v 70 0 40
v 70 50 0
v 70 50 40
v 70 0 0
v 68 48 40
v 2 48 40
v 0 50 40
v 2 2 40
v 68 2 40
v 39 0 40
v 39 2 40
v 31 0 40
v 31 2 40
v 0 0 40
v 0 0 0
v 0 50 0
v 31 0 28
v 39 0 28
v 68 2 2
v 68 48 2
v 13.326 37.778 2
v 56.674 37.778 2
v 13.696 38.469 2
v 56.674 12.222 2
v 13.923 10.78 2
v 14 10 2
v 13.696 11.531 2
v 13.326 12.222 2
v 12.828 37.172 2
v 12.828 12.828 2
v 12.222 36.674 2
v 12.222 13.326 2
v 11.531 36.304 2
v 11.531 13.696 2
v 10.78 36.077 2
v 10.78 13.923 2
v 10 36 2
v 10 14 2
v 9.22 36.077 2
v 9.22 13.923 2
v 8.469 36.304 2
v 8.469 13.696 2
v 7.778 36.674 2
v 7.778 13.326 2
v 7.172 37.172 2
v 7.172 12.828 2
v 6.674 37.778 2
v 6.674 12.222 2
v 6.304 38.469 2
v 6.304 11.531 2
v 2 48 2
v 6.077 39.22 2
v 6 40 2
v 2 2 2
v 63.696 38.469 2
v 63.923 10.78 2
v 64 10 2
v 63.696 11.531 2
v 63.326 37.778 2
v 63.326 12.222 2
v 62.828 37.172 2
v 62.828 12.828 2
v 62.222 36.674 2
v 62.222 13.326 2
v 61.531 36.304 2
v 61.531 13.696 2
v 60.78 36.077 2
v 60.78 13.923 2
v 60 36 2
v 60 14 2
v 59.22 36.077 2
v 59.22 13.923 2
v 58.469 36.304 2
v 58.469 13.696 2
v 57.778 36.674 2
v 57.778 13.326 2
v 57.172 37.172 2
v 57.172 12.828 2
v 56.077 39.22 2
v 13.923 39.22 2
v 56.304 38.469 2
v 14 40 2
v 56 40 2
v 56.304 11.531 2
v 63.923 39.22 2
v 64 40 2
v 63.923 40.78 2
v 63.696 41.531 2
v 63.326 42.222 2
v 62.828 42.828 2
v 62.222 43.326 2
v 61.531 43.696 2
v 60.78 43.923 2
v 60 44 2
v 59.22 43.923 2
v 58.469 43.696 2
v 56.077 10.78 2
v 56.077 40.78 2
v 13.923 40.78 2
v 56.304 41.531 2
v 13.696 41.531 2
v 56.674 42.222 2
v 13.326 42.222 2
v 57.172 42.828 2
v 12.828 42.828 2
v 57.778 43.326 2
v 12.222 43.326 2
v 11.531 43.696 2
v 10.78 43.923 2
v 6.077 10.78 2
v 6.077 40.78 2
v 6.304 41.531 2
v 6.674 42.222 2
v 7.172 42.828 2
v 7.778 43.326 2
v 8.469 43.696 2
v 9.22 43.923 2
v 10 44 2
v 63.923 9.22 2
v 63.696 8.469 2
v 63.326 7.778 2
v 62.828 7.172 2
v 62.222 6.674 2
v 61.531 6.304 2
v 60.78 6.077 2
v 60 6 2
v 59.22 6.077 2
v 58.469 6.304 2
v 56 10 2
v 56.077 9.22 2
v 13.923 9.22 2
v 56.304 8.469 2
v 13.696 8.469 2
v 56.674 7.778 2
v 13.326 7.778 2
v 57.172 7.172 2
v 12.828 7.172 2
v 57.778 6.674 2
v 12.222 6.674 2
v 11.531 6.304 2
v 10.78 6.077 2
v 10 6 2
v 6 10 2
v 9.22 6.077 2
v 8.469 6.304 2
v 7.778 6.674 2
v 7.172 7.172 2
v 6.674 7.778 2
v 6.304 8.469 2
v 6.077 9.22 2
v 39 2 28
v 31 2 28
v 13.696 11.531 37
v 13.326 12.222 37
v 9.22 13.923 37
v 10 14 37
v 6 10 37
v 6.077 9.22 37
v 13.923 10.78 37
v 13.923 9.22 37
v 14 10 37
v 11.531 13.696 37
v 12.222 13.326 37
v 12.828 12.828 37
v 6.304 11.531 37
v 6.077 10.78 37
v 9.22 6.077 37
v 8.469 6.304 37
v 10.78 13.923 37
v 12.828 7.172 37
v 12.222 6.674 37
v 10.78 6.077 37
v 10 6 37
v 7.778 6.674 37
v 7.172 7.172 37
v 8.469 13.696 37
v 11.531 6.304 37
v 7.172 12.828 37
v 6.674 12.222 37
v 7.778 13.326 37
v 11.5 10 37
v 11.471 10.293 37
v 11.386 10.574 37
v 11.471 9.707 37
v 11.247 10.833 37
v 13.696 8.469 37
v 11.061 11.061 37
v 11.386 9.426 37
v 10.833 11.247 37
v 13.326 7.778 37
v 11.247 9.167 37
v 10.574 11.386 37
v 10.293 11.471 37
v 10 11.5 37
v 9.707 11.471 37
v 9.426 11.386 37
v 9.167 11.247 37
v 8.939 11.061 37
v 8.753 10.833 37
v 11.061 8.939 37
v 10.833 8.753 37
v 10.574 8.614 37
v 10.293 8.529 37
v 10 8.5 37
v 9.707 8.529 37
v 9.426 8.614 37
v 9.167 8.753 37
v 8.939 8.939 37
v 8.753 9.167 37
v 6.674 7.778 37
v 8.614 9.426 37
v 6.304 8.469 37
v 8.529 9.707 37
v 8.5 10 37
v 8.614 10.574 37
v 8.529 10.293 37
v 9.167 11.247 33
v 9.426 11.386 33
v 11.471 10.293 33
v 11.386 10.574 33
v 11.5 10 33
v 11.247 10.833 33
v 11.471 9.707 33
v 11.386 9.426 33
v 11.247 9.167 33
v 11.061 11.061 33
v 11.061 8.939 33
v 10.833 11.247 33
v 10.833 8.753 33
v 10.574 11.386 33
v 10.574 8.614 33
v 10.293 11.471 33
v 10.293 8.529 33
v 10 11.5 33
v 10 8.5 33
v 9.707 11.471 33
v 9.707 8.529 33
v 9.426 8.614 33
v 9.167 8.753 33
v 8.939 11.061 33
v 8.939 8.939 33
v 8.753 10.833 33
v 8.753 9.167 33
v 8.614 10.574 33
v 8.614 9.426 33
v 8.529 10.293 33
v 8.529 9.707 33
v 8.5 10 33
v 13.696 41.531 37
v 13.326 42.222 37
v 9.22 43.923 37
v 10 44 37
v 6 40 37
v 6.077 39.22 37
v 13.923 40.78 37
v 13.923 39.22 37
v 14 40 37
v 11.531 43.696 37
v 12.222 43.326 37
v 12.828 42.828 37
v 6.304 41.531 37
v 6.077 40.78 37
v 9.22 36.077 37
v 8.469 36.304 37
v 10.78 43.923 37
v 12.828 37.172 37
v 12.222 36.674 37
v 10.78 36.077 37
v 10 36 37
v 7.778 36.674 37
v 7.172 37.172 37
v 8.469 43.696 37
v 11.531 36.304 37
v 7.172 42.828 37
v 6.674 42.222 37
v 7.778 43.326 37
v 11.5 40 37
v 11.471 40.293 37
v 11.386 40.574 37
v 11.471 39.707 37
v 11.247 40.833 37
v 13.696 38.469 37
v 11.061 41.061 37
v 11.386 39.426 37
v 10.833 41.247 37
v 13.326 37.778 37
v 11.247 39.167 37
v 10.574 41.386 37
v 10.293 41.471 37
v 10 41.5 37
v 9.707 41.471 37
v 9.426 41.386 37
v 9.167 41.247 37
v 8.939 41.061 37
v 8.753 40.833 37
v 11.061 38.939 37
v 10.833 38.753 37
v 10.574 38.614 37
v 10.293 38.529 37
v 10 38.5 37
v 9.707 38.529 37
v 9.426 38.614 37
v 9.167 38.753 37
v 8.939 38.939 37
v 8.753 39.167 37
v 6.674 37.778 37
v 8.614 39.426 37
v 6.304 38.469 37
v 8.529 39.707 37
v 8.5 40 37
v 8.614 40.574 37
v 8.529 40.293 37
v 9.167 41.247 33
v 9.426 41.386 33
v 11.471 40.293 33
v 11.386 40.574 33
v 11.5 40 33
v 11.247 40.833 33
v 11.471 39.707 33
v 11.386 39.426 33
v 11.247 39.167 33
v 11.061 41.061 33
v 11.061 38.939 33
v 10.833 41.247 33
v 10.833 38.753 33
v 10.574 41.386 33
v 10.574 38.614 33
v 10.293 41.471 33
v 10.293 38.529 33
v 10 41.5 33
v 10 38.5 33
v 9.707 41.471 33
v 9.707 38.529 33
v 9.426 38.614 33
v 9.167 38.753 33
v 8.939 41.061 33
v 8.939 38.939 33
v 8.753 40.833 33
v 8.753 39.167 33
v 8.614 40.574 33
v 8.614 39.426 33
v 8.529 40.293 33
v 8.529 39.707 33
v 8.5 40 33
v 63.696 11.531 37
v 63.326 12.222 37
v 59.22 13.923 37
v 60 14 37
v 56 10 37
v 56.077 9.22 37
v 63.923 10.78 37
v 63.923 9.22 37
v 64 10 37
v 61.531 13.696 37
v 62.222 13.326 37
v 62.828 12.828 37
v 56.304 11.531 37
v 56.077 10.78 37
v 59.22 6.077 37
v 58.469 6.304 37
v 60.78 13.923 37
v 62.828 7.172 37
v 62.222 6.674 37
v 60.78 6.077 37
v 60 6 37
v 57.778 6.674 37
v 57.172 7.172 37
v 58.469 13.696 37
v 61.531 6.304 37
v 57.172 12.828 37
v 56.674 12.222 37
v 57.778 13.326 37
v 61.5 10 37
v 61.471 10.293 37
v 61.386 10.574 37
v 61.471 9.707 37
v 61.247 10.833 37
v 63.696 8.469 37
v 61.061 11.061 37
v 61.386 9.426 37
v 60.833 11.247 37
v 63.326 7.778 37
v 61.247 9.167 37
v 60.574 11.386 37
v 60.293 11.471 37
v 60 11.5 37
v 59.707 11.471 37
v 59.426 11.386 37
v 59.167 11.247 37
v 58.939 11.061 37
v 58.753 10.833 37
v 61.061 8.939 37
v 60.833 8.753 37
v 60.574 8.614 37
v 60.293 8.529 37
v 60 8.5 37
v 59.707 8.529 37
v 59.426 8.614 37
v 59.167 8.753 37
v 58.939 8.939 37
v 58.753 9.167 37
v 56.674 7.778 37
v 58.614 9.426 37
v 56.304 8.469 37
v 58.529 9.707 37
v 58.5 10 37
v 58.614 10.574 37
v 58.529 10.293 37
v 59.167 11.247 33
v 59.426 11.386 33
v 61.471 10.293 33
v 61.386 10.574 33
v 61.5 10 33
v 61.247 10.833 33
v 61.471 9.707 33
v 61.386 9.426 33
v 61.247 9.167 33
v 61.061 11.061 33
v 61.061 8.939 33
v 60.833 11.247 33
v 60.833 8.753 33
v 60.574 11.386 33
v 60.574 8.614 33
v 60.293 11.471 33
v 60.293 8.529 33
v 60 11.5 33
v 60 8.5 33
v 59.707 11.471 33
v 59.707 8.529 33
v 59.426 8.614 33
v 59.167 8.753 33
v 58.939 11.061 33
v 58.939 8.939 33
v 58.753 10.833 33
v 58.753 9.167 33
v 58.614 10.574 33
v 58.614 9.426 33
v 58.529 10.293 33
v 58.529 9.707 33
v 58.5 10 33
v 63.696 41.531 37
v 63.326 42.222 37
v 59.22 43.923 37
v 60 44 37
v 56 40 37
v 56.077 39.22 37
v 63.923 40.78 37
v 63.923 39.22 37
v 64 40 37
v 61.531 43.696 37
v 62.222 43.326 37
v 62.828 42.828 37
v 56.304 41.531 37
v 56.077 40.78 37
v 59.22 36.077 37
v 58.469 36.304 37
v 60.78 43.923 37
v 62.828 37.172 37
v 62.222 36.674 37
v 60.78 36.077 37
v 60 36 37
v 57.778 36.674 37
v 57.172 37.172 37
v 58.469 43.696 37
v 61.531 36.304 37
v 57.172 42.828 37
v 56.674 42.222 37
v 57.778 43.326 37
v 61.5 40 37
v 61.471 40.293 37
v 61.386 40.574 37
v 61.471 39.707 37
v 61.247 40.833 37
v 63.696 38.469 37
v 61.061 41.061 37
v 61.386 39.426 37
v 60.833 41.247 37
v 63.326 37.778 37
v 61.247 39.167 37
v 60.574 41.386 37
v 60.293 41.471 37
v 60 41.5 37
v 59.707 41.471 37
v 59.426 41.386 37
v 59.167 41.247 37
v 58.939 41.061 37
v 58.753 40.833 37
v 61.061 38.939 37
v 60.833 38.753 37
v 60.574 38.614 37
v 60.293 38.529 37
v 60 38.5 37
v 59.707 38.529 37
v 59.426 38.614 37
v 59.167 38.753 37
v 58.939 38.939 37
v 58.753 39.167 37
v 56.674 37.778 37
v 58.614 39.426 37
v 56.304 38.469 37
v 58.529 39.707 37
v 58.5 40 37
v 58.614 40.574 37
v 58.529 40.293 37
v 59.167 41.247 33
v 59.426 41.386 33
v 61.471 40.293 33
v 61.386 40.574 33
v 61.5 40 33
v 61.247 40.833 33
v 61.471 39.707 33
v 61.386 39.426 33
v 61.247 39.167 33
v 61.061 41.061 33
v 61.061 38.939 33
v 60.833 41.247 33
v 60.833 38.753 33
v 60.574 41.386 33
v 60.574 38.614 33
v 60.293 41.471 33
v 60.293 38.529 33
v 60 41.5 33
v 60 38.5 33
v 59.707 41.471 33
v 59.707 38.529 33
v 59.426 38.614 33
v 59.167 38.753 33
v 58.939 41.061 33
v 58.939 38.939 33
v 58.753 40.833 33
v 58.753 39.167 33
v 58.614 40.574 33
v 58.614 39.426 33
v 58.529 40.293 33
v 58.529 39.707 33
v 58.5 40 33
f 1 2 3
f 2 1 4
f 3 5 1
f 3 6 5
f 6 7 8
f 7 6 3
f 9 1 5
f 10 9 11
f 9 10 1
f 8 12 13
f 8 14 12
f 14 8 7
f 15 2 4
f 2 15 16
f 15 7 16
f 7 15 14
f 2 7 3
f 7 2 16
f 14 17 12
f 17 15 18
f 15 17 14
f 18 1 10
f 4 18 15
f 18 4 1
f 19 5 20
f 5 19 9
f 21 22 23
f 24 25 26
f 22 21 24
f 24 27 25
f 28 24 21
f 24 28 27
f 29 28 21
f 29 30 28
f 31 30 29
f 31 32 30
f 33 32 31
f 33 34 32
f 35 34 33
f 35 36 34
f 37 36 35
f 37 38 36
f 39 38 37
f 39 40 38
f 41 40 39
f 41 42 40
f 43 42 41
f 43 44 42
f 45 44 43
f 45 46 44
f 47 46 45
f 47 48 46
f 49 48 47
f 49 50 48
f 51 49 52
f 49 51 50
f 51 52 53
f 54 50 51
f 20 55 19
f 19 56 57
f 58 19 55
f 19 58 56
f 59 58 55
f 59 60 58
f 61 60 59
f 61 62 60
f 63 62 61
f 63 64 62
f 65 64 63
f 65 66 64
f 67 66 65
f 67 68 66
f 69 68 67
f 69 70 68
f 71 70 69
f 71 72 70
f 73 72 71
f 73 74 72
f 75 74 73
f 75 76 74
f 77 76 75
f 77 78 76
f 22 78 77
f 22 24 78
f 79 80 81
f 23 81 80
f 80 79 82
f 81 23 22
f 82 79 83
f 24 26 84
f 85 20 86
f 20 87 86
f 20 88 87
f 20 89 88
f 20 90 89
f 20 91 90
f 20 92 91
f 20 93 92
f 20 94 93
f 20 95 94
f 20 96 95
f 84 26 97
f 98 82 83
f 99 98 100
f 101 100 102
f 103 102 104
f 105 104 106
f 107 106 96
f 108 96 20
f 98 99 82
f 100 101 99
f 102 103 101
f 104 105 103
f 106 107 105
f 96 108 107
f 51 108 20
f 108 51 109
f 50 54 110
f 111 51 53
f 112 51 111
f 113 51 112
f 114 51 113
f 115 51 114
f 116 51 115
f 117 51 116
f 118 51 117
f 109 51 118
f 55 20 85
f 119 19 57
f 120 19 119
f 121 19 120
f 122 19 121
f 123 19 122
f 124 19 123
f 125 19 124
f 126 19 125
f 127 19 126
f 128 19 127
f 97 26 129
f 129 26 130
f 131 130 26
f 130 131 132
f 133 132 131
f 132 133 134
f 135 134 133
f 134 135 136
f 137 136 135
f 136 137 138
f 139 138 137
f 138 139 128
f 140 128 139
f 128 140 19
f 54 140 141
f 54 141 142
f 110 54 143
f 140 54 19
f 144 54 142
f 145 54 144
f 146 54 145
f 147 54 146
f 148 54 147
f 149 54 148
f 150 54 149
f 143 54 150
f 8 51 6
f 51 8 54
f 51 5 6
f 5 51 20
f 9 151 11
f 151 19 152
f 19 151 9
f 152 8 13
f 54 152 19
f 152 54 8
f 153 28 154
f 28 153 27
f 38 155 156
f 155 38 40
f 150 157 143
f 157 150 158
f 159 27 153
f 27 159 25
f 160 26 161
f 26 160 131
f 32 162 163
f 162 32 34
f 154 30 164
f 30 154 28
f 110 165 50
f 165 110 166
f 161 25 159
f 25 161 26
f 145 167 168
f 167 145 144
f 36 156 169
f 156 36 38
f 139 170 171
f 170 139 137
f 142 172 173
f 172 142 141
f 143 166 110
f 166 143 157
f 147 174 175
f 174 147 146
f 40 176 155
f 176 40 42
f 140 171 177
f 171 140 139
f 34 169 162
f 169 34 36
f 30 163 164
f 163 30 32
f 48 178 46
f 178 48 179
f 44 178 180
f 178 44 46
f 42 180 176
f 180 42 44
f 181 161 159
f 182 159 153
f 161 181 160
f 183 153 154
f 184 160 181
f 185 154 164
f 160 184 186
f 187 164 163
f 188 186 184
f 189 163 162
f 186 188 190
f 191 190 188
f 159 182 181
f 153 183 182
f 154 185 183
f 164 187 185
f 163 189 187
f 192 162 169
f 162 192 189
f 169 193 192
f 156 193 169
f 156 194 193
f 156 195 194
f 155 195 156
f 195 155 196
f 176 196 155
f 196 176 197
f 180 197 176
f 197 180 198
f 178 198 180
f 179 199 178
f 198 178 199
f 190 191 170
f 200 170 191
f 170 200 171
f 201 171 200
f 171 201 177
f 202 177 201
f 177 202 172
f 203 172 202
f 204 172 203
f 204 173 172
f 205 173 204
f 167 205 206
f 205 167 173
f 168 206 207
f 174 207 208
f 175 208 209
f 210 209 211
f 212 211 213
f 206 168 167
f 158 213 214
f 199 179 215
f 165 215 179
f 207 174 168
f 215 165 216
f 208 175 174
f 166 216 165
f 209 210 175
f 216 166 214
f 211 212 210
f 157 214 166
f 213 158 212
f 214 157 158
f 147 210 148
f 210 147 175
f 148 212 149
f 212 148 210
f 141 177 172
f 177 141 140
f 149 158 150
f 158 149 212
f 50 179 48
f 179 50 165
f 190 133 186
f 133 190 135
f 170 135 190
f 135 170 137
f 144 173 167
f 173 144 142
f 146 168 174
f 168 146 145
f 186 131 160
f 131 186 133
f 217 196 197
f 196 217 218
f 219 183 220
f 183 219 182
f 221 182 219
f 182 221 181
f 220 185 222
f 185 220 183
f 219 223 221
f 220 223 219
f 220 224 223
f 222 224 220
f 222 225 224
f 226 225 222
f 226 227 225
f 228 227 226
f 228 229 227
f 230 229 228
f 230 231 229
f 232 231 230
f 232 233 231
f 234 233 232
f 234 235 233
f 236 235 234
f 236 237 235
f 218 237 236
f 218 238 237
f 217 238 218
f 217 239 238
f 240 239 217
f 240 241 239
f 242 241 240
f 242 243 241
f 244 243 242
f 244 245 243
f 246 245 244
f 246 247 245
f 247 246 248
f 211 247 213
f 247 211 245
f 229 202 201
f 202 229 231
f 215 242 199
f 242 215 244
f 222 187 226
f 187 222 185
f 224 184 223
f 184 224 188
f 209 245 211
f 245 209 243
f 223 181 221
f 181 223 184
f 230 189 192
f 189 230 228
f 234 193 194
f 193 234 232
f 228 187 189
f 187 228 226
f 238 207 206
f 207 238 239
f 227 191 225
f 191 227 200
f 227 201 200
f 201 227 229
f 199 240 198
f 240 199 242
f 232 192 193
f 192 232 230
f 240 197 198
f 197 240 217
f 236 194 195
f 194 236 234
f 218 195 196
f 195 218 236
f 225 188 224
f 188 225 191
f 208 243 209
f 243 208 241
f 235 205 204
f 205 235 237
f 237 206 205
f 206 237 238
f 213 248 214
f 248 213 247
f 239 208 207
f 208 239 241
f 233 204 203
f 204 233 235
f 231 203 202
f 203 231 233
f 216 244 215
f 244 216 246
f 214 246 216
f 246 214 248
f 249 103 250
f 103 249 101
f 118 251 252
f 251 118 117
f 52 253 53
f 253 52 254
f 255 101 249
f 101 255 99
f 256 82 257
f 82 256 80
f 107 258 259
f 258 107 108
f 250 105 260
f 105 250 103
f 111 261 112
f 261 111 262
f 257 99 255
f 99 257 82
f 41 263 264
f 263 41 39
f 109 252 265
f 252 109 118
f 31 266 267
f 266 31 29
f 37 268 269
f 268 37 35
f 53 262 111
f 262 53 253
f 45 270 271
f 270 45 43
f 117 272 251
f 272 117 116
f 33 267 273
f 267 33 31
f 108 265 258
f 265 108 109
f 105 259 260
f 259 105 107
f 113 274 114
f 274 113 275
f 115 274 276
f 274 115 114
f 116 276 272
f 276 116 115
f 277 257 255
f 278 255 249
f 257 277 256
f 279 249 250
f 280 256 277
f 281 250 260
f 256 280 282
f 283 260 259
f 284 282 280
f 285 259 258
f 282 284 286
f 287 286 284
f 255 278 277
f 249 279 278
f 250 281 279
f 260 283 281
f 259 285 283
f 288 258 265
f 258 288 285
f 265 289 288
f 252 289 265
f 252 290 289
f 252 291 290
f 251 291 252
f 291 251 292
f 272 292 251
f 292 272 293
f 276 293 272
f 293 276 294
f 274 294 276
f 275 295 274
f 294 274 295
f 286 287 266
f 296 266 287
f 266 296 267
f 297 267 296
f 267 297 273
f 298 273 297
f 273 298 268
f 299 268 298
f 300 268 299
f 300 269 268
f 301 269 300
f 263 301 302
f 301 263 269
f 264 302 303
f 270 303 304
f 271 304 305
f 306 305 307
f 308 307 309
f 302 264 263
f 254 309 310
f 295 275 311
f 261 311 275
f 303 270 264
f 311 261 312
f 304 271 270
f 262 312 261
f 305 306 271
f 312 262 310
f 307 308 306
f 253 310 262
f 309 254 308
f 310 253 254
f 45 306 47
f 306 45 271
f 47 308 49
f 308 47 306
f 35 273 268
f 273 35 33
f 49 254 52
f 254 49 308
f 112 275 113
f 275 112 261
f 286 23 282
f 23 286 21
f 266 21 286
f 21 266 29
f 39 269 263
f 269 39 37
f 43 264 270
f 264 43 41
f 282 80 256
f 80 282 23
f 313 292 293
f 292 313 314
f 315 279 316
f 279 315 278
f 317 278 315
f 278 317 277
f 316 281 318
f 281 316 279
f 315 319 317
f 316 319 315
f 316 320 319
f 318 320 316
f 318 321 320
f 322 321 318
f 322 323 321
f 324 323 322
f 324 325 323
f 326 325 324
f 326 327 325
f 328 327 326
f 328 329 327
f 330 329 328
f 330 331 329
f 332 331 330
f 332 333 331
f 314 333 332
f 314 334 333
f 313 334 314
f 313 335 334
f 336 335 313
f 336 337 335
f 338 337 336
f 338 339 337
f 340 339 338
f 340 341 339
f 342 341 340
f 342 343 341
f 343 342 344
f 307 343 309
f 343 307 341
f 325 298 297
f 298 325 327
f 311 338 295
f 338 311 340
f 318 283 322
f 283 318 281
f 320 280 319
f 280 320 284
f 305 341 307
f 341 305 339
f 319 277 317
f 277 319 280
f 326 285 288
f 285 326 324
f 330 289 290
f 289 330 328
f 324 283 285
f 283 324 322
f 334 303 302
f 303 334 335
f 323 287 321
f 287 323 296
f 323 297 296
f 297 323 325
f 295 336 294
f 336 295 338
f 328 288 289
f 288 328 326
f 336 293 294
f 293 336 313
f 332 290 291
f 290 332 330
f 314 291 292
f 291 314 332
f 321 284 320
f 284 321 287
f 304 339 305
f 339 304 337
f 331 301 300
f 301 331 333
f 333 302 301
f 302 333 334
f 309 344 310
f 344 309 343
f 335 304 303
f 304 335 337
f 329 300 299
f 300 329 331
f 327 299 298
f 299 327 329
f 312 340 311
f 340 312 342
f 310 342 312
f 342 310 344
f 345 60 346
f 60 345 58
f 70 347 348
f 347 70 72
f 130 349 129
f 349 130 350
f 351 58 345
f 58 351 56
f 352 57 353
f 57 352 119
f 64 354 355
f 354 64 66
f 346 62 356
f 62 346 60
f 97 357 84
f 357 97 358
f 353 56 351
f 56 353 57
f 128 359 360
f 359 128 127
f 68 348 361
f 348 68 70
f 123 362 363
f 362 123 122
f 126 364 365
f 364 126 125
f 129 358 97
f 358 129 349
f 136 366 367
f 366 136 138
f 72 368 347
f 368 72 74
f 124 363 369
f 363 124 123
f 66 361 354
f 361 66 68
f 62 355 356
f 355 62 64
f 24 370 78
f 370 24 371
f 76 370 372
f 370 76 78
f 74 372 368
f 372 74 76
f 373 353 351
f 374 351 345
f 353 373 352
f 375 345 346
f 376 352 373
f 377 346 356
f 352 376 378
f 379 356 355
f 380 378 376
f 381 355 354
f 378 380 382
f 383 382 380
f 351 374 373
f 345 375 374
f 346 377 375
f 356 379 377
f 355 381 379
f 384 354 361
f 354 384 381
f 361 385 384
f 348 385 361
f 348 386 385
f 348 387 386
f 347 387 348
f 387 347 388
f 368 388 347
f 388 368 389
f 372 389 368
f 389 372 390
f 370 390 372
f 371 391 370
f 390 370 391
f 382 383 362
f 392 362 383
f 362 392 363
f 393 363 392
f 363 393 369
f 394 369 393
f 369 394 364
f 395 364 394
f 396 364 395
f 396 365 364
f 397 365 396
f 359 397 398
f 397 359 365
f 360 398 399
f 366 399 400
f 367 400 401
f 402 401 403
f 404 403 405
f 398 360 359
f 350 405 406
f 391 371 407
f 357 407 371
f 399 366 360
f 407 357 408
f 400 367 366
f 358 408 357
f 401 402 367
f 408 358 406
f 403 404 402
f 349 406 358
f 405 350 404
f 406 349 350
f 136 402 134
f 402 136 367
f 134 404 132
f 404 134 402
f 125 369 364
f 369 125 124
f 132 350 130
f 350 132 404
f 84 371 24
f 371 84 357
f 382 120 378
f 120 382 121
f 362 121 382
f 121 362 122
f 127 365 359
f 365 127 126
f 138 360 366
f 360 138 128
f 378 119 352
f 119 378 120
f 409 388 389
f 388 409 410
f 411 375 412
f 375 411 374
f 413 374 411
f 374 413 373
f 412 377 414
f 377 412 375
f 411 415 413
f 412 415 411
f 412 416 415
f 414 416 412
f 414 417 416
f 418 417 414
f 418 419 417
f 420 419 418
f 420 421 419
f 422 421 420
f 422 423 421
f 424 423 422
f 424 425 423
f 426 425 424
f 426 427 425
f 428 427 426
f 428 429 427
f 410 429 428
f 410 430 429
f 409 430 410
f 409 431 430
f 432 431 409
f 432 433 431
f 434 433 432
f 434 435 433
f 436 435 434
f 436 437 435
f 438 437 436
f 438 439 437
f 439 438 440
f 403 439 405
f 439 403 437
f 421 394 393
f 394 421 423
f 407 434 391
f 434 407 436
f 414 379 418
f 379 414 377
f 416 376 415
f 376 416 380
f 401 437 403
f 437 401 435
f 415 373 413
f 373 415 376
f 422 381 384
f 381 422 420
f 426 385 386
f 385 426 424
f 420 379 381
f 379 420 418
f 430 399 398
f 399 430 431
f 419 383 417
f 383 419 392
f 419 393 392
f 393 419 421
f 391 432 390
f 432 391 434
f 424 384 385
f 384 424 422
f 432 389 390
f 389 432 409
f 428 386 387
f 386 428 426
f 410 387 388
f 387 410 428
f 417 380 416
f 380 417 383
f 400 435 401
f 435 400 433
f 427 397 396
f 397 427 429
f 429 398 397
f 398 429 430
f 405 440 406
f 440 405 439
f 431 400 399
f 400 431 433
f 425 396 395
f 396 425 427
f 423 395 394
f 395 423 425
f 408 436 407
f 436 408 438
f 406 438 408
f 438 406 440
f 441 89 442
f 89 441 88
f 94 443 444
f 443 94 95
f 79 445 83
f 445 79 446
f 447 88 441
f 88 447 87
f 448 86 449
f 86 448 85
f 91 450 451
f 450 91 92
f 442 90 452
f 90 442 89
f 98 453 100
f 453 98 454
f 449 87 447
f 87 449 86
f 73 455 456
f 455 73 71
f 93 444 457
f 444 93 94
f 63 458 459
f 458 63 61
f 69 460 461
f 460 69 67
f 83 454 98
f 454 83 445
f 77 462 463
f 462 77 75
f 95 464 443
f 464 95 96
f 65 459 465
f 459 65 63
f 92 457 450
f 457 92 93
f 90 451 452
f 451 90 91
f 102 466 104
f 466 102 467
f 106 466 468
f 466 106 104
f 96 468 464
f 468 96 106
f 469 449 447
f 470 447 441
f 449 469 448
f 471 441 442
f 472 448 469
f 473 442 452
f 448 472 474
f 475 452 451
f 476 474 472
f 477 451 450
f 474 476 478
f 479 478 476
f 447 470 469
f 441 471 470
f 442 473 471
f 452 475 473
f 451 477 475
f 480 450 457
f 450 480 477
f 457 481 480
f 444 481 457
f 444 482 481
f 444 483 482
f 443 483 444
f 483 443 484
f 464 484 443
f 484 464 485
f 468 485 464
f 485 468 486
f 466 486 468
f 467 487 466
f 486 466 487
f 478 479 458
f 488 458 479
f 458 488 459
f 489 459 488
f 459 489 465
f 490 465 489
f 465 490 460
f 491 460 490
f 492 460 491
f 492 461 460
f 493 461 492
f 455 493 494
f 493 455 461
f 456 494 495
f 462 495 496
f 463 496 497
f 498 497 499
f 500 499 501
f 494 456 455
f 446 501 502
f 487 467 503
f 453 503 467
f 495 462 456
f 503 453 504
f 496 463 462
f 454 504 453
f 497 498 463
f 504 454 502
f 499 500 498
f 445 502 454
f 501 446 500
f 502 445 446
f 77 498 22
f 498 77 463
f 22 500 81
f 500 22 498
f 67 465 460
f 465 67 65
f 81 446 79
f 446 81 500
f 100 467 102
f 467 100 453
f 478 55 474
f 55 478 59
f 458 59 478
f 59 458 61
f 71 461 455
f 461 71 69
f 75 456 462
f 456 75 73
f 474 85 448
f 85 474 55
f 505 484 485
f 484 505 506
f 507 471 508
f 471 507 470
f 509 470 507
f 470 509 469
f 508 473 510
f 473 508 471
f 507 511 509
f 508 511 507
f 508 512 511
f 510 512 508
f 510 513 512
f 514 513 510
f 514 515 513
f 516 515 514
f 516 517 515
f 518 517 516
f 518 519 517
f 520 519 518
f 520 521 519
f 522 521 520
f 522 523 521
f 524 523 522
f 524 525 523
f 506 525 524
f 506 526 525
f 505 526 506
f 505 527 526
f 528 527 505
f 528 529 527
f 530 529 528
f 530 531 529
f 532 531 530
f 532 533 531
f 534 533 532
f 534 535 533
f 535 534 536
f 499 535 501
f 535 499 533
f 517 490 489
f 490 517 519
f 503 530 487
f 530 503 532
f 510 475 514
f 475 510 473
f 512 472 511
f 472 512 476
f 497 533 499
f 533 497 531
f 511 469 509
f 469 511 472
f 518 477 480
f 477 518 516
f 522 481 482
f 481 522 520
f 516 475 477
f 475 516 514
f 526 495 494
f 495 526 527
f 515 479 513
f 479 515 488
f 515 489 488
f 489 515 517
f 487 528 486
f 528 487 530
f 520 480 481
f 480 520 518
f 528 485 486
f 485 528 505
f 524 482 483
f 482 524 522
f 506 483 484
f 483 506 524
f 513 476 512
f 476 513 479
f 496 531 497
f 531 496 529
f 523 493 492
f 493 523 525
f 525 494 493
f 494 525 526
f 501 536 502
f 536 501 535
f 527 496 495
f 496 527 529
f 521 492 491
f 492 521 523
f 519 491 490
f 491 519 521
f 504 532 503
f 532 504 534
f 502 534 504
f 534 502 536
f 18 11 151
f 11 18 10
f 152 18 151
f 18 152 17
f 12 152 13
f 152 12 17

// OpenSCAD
$fn = 32;

// ----------------------------------------------------------------------
// Enclosure box: both enclosure
// ----------------------------------------------------------------------

// --- parameters (mm) ---
box_l = 70;               // outer length, X
box_w = 50;               // outer width, Y
box_h = 40;               // outer height
wall_t = 2;               // wall thickness
boss_r = 4;               // corner boss radius
hole_r = 1.5;             // boss screw hole radius
boss_in = 10;             // boss inset from the corners
notch_w = 8;              // cable notch width
notch_h = 12;             // cable notch height

inner_h = box_h - wall_t;  // cavity depth
boss_h = inner_h - 2;  // corner boss height

difference() {
  union() {
    difference() {
      cube([box_l, box_w, box_h]);
      translate([wall_t, wall_t, wall_t])
        cube([box_l - 2 * wall_t, box_w - 2 * wall_t, box_h]);
    }
    for (sx = [0, 1], sy = [0, 1])
      translate([sx ? box_l - boss_in : boss_in,
                 sy ? box_w - boss_in : boss_in, wall_t - 1])
        difference() {
          cylinder(r = boss_r, h = boss_h);
          translate([0, 0, boss_h - 4])
            cylinder(r = hole_r, h = 5);
        }
  }
  translate([box_l / 2 - notch_w / 2, -1, box_h - notch_h])
    cube([notch_w, wall_t + 2, notch_h + 1]);
}
